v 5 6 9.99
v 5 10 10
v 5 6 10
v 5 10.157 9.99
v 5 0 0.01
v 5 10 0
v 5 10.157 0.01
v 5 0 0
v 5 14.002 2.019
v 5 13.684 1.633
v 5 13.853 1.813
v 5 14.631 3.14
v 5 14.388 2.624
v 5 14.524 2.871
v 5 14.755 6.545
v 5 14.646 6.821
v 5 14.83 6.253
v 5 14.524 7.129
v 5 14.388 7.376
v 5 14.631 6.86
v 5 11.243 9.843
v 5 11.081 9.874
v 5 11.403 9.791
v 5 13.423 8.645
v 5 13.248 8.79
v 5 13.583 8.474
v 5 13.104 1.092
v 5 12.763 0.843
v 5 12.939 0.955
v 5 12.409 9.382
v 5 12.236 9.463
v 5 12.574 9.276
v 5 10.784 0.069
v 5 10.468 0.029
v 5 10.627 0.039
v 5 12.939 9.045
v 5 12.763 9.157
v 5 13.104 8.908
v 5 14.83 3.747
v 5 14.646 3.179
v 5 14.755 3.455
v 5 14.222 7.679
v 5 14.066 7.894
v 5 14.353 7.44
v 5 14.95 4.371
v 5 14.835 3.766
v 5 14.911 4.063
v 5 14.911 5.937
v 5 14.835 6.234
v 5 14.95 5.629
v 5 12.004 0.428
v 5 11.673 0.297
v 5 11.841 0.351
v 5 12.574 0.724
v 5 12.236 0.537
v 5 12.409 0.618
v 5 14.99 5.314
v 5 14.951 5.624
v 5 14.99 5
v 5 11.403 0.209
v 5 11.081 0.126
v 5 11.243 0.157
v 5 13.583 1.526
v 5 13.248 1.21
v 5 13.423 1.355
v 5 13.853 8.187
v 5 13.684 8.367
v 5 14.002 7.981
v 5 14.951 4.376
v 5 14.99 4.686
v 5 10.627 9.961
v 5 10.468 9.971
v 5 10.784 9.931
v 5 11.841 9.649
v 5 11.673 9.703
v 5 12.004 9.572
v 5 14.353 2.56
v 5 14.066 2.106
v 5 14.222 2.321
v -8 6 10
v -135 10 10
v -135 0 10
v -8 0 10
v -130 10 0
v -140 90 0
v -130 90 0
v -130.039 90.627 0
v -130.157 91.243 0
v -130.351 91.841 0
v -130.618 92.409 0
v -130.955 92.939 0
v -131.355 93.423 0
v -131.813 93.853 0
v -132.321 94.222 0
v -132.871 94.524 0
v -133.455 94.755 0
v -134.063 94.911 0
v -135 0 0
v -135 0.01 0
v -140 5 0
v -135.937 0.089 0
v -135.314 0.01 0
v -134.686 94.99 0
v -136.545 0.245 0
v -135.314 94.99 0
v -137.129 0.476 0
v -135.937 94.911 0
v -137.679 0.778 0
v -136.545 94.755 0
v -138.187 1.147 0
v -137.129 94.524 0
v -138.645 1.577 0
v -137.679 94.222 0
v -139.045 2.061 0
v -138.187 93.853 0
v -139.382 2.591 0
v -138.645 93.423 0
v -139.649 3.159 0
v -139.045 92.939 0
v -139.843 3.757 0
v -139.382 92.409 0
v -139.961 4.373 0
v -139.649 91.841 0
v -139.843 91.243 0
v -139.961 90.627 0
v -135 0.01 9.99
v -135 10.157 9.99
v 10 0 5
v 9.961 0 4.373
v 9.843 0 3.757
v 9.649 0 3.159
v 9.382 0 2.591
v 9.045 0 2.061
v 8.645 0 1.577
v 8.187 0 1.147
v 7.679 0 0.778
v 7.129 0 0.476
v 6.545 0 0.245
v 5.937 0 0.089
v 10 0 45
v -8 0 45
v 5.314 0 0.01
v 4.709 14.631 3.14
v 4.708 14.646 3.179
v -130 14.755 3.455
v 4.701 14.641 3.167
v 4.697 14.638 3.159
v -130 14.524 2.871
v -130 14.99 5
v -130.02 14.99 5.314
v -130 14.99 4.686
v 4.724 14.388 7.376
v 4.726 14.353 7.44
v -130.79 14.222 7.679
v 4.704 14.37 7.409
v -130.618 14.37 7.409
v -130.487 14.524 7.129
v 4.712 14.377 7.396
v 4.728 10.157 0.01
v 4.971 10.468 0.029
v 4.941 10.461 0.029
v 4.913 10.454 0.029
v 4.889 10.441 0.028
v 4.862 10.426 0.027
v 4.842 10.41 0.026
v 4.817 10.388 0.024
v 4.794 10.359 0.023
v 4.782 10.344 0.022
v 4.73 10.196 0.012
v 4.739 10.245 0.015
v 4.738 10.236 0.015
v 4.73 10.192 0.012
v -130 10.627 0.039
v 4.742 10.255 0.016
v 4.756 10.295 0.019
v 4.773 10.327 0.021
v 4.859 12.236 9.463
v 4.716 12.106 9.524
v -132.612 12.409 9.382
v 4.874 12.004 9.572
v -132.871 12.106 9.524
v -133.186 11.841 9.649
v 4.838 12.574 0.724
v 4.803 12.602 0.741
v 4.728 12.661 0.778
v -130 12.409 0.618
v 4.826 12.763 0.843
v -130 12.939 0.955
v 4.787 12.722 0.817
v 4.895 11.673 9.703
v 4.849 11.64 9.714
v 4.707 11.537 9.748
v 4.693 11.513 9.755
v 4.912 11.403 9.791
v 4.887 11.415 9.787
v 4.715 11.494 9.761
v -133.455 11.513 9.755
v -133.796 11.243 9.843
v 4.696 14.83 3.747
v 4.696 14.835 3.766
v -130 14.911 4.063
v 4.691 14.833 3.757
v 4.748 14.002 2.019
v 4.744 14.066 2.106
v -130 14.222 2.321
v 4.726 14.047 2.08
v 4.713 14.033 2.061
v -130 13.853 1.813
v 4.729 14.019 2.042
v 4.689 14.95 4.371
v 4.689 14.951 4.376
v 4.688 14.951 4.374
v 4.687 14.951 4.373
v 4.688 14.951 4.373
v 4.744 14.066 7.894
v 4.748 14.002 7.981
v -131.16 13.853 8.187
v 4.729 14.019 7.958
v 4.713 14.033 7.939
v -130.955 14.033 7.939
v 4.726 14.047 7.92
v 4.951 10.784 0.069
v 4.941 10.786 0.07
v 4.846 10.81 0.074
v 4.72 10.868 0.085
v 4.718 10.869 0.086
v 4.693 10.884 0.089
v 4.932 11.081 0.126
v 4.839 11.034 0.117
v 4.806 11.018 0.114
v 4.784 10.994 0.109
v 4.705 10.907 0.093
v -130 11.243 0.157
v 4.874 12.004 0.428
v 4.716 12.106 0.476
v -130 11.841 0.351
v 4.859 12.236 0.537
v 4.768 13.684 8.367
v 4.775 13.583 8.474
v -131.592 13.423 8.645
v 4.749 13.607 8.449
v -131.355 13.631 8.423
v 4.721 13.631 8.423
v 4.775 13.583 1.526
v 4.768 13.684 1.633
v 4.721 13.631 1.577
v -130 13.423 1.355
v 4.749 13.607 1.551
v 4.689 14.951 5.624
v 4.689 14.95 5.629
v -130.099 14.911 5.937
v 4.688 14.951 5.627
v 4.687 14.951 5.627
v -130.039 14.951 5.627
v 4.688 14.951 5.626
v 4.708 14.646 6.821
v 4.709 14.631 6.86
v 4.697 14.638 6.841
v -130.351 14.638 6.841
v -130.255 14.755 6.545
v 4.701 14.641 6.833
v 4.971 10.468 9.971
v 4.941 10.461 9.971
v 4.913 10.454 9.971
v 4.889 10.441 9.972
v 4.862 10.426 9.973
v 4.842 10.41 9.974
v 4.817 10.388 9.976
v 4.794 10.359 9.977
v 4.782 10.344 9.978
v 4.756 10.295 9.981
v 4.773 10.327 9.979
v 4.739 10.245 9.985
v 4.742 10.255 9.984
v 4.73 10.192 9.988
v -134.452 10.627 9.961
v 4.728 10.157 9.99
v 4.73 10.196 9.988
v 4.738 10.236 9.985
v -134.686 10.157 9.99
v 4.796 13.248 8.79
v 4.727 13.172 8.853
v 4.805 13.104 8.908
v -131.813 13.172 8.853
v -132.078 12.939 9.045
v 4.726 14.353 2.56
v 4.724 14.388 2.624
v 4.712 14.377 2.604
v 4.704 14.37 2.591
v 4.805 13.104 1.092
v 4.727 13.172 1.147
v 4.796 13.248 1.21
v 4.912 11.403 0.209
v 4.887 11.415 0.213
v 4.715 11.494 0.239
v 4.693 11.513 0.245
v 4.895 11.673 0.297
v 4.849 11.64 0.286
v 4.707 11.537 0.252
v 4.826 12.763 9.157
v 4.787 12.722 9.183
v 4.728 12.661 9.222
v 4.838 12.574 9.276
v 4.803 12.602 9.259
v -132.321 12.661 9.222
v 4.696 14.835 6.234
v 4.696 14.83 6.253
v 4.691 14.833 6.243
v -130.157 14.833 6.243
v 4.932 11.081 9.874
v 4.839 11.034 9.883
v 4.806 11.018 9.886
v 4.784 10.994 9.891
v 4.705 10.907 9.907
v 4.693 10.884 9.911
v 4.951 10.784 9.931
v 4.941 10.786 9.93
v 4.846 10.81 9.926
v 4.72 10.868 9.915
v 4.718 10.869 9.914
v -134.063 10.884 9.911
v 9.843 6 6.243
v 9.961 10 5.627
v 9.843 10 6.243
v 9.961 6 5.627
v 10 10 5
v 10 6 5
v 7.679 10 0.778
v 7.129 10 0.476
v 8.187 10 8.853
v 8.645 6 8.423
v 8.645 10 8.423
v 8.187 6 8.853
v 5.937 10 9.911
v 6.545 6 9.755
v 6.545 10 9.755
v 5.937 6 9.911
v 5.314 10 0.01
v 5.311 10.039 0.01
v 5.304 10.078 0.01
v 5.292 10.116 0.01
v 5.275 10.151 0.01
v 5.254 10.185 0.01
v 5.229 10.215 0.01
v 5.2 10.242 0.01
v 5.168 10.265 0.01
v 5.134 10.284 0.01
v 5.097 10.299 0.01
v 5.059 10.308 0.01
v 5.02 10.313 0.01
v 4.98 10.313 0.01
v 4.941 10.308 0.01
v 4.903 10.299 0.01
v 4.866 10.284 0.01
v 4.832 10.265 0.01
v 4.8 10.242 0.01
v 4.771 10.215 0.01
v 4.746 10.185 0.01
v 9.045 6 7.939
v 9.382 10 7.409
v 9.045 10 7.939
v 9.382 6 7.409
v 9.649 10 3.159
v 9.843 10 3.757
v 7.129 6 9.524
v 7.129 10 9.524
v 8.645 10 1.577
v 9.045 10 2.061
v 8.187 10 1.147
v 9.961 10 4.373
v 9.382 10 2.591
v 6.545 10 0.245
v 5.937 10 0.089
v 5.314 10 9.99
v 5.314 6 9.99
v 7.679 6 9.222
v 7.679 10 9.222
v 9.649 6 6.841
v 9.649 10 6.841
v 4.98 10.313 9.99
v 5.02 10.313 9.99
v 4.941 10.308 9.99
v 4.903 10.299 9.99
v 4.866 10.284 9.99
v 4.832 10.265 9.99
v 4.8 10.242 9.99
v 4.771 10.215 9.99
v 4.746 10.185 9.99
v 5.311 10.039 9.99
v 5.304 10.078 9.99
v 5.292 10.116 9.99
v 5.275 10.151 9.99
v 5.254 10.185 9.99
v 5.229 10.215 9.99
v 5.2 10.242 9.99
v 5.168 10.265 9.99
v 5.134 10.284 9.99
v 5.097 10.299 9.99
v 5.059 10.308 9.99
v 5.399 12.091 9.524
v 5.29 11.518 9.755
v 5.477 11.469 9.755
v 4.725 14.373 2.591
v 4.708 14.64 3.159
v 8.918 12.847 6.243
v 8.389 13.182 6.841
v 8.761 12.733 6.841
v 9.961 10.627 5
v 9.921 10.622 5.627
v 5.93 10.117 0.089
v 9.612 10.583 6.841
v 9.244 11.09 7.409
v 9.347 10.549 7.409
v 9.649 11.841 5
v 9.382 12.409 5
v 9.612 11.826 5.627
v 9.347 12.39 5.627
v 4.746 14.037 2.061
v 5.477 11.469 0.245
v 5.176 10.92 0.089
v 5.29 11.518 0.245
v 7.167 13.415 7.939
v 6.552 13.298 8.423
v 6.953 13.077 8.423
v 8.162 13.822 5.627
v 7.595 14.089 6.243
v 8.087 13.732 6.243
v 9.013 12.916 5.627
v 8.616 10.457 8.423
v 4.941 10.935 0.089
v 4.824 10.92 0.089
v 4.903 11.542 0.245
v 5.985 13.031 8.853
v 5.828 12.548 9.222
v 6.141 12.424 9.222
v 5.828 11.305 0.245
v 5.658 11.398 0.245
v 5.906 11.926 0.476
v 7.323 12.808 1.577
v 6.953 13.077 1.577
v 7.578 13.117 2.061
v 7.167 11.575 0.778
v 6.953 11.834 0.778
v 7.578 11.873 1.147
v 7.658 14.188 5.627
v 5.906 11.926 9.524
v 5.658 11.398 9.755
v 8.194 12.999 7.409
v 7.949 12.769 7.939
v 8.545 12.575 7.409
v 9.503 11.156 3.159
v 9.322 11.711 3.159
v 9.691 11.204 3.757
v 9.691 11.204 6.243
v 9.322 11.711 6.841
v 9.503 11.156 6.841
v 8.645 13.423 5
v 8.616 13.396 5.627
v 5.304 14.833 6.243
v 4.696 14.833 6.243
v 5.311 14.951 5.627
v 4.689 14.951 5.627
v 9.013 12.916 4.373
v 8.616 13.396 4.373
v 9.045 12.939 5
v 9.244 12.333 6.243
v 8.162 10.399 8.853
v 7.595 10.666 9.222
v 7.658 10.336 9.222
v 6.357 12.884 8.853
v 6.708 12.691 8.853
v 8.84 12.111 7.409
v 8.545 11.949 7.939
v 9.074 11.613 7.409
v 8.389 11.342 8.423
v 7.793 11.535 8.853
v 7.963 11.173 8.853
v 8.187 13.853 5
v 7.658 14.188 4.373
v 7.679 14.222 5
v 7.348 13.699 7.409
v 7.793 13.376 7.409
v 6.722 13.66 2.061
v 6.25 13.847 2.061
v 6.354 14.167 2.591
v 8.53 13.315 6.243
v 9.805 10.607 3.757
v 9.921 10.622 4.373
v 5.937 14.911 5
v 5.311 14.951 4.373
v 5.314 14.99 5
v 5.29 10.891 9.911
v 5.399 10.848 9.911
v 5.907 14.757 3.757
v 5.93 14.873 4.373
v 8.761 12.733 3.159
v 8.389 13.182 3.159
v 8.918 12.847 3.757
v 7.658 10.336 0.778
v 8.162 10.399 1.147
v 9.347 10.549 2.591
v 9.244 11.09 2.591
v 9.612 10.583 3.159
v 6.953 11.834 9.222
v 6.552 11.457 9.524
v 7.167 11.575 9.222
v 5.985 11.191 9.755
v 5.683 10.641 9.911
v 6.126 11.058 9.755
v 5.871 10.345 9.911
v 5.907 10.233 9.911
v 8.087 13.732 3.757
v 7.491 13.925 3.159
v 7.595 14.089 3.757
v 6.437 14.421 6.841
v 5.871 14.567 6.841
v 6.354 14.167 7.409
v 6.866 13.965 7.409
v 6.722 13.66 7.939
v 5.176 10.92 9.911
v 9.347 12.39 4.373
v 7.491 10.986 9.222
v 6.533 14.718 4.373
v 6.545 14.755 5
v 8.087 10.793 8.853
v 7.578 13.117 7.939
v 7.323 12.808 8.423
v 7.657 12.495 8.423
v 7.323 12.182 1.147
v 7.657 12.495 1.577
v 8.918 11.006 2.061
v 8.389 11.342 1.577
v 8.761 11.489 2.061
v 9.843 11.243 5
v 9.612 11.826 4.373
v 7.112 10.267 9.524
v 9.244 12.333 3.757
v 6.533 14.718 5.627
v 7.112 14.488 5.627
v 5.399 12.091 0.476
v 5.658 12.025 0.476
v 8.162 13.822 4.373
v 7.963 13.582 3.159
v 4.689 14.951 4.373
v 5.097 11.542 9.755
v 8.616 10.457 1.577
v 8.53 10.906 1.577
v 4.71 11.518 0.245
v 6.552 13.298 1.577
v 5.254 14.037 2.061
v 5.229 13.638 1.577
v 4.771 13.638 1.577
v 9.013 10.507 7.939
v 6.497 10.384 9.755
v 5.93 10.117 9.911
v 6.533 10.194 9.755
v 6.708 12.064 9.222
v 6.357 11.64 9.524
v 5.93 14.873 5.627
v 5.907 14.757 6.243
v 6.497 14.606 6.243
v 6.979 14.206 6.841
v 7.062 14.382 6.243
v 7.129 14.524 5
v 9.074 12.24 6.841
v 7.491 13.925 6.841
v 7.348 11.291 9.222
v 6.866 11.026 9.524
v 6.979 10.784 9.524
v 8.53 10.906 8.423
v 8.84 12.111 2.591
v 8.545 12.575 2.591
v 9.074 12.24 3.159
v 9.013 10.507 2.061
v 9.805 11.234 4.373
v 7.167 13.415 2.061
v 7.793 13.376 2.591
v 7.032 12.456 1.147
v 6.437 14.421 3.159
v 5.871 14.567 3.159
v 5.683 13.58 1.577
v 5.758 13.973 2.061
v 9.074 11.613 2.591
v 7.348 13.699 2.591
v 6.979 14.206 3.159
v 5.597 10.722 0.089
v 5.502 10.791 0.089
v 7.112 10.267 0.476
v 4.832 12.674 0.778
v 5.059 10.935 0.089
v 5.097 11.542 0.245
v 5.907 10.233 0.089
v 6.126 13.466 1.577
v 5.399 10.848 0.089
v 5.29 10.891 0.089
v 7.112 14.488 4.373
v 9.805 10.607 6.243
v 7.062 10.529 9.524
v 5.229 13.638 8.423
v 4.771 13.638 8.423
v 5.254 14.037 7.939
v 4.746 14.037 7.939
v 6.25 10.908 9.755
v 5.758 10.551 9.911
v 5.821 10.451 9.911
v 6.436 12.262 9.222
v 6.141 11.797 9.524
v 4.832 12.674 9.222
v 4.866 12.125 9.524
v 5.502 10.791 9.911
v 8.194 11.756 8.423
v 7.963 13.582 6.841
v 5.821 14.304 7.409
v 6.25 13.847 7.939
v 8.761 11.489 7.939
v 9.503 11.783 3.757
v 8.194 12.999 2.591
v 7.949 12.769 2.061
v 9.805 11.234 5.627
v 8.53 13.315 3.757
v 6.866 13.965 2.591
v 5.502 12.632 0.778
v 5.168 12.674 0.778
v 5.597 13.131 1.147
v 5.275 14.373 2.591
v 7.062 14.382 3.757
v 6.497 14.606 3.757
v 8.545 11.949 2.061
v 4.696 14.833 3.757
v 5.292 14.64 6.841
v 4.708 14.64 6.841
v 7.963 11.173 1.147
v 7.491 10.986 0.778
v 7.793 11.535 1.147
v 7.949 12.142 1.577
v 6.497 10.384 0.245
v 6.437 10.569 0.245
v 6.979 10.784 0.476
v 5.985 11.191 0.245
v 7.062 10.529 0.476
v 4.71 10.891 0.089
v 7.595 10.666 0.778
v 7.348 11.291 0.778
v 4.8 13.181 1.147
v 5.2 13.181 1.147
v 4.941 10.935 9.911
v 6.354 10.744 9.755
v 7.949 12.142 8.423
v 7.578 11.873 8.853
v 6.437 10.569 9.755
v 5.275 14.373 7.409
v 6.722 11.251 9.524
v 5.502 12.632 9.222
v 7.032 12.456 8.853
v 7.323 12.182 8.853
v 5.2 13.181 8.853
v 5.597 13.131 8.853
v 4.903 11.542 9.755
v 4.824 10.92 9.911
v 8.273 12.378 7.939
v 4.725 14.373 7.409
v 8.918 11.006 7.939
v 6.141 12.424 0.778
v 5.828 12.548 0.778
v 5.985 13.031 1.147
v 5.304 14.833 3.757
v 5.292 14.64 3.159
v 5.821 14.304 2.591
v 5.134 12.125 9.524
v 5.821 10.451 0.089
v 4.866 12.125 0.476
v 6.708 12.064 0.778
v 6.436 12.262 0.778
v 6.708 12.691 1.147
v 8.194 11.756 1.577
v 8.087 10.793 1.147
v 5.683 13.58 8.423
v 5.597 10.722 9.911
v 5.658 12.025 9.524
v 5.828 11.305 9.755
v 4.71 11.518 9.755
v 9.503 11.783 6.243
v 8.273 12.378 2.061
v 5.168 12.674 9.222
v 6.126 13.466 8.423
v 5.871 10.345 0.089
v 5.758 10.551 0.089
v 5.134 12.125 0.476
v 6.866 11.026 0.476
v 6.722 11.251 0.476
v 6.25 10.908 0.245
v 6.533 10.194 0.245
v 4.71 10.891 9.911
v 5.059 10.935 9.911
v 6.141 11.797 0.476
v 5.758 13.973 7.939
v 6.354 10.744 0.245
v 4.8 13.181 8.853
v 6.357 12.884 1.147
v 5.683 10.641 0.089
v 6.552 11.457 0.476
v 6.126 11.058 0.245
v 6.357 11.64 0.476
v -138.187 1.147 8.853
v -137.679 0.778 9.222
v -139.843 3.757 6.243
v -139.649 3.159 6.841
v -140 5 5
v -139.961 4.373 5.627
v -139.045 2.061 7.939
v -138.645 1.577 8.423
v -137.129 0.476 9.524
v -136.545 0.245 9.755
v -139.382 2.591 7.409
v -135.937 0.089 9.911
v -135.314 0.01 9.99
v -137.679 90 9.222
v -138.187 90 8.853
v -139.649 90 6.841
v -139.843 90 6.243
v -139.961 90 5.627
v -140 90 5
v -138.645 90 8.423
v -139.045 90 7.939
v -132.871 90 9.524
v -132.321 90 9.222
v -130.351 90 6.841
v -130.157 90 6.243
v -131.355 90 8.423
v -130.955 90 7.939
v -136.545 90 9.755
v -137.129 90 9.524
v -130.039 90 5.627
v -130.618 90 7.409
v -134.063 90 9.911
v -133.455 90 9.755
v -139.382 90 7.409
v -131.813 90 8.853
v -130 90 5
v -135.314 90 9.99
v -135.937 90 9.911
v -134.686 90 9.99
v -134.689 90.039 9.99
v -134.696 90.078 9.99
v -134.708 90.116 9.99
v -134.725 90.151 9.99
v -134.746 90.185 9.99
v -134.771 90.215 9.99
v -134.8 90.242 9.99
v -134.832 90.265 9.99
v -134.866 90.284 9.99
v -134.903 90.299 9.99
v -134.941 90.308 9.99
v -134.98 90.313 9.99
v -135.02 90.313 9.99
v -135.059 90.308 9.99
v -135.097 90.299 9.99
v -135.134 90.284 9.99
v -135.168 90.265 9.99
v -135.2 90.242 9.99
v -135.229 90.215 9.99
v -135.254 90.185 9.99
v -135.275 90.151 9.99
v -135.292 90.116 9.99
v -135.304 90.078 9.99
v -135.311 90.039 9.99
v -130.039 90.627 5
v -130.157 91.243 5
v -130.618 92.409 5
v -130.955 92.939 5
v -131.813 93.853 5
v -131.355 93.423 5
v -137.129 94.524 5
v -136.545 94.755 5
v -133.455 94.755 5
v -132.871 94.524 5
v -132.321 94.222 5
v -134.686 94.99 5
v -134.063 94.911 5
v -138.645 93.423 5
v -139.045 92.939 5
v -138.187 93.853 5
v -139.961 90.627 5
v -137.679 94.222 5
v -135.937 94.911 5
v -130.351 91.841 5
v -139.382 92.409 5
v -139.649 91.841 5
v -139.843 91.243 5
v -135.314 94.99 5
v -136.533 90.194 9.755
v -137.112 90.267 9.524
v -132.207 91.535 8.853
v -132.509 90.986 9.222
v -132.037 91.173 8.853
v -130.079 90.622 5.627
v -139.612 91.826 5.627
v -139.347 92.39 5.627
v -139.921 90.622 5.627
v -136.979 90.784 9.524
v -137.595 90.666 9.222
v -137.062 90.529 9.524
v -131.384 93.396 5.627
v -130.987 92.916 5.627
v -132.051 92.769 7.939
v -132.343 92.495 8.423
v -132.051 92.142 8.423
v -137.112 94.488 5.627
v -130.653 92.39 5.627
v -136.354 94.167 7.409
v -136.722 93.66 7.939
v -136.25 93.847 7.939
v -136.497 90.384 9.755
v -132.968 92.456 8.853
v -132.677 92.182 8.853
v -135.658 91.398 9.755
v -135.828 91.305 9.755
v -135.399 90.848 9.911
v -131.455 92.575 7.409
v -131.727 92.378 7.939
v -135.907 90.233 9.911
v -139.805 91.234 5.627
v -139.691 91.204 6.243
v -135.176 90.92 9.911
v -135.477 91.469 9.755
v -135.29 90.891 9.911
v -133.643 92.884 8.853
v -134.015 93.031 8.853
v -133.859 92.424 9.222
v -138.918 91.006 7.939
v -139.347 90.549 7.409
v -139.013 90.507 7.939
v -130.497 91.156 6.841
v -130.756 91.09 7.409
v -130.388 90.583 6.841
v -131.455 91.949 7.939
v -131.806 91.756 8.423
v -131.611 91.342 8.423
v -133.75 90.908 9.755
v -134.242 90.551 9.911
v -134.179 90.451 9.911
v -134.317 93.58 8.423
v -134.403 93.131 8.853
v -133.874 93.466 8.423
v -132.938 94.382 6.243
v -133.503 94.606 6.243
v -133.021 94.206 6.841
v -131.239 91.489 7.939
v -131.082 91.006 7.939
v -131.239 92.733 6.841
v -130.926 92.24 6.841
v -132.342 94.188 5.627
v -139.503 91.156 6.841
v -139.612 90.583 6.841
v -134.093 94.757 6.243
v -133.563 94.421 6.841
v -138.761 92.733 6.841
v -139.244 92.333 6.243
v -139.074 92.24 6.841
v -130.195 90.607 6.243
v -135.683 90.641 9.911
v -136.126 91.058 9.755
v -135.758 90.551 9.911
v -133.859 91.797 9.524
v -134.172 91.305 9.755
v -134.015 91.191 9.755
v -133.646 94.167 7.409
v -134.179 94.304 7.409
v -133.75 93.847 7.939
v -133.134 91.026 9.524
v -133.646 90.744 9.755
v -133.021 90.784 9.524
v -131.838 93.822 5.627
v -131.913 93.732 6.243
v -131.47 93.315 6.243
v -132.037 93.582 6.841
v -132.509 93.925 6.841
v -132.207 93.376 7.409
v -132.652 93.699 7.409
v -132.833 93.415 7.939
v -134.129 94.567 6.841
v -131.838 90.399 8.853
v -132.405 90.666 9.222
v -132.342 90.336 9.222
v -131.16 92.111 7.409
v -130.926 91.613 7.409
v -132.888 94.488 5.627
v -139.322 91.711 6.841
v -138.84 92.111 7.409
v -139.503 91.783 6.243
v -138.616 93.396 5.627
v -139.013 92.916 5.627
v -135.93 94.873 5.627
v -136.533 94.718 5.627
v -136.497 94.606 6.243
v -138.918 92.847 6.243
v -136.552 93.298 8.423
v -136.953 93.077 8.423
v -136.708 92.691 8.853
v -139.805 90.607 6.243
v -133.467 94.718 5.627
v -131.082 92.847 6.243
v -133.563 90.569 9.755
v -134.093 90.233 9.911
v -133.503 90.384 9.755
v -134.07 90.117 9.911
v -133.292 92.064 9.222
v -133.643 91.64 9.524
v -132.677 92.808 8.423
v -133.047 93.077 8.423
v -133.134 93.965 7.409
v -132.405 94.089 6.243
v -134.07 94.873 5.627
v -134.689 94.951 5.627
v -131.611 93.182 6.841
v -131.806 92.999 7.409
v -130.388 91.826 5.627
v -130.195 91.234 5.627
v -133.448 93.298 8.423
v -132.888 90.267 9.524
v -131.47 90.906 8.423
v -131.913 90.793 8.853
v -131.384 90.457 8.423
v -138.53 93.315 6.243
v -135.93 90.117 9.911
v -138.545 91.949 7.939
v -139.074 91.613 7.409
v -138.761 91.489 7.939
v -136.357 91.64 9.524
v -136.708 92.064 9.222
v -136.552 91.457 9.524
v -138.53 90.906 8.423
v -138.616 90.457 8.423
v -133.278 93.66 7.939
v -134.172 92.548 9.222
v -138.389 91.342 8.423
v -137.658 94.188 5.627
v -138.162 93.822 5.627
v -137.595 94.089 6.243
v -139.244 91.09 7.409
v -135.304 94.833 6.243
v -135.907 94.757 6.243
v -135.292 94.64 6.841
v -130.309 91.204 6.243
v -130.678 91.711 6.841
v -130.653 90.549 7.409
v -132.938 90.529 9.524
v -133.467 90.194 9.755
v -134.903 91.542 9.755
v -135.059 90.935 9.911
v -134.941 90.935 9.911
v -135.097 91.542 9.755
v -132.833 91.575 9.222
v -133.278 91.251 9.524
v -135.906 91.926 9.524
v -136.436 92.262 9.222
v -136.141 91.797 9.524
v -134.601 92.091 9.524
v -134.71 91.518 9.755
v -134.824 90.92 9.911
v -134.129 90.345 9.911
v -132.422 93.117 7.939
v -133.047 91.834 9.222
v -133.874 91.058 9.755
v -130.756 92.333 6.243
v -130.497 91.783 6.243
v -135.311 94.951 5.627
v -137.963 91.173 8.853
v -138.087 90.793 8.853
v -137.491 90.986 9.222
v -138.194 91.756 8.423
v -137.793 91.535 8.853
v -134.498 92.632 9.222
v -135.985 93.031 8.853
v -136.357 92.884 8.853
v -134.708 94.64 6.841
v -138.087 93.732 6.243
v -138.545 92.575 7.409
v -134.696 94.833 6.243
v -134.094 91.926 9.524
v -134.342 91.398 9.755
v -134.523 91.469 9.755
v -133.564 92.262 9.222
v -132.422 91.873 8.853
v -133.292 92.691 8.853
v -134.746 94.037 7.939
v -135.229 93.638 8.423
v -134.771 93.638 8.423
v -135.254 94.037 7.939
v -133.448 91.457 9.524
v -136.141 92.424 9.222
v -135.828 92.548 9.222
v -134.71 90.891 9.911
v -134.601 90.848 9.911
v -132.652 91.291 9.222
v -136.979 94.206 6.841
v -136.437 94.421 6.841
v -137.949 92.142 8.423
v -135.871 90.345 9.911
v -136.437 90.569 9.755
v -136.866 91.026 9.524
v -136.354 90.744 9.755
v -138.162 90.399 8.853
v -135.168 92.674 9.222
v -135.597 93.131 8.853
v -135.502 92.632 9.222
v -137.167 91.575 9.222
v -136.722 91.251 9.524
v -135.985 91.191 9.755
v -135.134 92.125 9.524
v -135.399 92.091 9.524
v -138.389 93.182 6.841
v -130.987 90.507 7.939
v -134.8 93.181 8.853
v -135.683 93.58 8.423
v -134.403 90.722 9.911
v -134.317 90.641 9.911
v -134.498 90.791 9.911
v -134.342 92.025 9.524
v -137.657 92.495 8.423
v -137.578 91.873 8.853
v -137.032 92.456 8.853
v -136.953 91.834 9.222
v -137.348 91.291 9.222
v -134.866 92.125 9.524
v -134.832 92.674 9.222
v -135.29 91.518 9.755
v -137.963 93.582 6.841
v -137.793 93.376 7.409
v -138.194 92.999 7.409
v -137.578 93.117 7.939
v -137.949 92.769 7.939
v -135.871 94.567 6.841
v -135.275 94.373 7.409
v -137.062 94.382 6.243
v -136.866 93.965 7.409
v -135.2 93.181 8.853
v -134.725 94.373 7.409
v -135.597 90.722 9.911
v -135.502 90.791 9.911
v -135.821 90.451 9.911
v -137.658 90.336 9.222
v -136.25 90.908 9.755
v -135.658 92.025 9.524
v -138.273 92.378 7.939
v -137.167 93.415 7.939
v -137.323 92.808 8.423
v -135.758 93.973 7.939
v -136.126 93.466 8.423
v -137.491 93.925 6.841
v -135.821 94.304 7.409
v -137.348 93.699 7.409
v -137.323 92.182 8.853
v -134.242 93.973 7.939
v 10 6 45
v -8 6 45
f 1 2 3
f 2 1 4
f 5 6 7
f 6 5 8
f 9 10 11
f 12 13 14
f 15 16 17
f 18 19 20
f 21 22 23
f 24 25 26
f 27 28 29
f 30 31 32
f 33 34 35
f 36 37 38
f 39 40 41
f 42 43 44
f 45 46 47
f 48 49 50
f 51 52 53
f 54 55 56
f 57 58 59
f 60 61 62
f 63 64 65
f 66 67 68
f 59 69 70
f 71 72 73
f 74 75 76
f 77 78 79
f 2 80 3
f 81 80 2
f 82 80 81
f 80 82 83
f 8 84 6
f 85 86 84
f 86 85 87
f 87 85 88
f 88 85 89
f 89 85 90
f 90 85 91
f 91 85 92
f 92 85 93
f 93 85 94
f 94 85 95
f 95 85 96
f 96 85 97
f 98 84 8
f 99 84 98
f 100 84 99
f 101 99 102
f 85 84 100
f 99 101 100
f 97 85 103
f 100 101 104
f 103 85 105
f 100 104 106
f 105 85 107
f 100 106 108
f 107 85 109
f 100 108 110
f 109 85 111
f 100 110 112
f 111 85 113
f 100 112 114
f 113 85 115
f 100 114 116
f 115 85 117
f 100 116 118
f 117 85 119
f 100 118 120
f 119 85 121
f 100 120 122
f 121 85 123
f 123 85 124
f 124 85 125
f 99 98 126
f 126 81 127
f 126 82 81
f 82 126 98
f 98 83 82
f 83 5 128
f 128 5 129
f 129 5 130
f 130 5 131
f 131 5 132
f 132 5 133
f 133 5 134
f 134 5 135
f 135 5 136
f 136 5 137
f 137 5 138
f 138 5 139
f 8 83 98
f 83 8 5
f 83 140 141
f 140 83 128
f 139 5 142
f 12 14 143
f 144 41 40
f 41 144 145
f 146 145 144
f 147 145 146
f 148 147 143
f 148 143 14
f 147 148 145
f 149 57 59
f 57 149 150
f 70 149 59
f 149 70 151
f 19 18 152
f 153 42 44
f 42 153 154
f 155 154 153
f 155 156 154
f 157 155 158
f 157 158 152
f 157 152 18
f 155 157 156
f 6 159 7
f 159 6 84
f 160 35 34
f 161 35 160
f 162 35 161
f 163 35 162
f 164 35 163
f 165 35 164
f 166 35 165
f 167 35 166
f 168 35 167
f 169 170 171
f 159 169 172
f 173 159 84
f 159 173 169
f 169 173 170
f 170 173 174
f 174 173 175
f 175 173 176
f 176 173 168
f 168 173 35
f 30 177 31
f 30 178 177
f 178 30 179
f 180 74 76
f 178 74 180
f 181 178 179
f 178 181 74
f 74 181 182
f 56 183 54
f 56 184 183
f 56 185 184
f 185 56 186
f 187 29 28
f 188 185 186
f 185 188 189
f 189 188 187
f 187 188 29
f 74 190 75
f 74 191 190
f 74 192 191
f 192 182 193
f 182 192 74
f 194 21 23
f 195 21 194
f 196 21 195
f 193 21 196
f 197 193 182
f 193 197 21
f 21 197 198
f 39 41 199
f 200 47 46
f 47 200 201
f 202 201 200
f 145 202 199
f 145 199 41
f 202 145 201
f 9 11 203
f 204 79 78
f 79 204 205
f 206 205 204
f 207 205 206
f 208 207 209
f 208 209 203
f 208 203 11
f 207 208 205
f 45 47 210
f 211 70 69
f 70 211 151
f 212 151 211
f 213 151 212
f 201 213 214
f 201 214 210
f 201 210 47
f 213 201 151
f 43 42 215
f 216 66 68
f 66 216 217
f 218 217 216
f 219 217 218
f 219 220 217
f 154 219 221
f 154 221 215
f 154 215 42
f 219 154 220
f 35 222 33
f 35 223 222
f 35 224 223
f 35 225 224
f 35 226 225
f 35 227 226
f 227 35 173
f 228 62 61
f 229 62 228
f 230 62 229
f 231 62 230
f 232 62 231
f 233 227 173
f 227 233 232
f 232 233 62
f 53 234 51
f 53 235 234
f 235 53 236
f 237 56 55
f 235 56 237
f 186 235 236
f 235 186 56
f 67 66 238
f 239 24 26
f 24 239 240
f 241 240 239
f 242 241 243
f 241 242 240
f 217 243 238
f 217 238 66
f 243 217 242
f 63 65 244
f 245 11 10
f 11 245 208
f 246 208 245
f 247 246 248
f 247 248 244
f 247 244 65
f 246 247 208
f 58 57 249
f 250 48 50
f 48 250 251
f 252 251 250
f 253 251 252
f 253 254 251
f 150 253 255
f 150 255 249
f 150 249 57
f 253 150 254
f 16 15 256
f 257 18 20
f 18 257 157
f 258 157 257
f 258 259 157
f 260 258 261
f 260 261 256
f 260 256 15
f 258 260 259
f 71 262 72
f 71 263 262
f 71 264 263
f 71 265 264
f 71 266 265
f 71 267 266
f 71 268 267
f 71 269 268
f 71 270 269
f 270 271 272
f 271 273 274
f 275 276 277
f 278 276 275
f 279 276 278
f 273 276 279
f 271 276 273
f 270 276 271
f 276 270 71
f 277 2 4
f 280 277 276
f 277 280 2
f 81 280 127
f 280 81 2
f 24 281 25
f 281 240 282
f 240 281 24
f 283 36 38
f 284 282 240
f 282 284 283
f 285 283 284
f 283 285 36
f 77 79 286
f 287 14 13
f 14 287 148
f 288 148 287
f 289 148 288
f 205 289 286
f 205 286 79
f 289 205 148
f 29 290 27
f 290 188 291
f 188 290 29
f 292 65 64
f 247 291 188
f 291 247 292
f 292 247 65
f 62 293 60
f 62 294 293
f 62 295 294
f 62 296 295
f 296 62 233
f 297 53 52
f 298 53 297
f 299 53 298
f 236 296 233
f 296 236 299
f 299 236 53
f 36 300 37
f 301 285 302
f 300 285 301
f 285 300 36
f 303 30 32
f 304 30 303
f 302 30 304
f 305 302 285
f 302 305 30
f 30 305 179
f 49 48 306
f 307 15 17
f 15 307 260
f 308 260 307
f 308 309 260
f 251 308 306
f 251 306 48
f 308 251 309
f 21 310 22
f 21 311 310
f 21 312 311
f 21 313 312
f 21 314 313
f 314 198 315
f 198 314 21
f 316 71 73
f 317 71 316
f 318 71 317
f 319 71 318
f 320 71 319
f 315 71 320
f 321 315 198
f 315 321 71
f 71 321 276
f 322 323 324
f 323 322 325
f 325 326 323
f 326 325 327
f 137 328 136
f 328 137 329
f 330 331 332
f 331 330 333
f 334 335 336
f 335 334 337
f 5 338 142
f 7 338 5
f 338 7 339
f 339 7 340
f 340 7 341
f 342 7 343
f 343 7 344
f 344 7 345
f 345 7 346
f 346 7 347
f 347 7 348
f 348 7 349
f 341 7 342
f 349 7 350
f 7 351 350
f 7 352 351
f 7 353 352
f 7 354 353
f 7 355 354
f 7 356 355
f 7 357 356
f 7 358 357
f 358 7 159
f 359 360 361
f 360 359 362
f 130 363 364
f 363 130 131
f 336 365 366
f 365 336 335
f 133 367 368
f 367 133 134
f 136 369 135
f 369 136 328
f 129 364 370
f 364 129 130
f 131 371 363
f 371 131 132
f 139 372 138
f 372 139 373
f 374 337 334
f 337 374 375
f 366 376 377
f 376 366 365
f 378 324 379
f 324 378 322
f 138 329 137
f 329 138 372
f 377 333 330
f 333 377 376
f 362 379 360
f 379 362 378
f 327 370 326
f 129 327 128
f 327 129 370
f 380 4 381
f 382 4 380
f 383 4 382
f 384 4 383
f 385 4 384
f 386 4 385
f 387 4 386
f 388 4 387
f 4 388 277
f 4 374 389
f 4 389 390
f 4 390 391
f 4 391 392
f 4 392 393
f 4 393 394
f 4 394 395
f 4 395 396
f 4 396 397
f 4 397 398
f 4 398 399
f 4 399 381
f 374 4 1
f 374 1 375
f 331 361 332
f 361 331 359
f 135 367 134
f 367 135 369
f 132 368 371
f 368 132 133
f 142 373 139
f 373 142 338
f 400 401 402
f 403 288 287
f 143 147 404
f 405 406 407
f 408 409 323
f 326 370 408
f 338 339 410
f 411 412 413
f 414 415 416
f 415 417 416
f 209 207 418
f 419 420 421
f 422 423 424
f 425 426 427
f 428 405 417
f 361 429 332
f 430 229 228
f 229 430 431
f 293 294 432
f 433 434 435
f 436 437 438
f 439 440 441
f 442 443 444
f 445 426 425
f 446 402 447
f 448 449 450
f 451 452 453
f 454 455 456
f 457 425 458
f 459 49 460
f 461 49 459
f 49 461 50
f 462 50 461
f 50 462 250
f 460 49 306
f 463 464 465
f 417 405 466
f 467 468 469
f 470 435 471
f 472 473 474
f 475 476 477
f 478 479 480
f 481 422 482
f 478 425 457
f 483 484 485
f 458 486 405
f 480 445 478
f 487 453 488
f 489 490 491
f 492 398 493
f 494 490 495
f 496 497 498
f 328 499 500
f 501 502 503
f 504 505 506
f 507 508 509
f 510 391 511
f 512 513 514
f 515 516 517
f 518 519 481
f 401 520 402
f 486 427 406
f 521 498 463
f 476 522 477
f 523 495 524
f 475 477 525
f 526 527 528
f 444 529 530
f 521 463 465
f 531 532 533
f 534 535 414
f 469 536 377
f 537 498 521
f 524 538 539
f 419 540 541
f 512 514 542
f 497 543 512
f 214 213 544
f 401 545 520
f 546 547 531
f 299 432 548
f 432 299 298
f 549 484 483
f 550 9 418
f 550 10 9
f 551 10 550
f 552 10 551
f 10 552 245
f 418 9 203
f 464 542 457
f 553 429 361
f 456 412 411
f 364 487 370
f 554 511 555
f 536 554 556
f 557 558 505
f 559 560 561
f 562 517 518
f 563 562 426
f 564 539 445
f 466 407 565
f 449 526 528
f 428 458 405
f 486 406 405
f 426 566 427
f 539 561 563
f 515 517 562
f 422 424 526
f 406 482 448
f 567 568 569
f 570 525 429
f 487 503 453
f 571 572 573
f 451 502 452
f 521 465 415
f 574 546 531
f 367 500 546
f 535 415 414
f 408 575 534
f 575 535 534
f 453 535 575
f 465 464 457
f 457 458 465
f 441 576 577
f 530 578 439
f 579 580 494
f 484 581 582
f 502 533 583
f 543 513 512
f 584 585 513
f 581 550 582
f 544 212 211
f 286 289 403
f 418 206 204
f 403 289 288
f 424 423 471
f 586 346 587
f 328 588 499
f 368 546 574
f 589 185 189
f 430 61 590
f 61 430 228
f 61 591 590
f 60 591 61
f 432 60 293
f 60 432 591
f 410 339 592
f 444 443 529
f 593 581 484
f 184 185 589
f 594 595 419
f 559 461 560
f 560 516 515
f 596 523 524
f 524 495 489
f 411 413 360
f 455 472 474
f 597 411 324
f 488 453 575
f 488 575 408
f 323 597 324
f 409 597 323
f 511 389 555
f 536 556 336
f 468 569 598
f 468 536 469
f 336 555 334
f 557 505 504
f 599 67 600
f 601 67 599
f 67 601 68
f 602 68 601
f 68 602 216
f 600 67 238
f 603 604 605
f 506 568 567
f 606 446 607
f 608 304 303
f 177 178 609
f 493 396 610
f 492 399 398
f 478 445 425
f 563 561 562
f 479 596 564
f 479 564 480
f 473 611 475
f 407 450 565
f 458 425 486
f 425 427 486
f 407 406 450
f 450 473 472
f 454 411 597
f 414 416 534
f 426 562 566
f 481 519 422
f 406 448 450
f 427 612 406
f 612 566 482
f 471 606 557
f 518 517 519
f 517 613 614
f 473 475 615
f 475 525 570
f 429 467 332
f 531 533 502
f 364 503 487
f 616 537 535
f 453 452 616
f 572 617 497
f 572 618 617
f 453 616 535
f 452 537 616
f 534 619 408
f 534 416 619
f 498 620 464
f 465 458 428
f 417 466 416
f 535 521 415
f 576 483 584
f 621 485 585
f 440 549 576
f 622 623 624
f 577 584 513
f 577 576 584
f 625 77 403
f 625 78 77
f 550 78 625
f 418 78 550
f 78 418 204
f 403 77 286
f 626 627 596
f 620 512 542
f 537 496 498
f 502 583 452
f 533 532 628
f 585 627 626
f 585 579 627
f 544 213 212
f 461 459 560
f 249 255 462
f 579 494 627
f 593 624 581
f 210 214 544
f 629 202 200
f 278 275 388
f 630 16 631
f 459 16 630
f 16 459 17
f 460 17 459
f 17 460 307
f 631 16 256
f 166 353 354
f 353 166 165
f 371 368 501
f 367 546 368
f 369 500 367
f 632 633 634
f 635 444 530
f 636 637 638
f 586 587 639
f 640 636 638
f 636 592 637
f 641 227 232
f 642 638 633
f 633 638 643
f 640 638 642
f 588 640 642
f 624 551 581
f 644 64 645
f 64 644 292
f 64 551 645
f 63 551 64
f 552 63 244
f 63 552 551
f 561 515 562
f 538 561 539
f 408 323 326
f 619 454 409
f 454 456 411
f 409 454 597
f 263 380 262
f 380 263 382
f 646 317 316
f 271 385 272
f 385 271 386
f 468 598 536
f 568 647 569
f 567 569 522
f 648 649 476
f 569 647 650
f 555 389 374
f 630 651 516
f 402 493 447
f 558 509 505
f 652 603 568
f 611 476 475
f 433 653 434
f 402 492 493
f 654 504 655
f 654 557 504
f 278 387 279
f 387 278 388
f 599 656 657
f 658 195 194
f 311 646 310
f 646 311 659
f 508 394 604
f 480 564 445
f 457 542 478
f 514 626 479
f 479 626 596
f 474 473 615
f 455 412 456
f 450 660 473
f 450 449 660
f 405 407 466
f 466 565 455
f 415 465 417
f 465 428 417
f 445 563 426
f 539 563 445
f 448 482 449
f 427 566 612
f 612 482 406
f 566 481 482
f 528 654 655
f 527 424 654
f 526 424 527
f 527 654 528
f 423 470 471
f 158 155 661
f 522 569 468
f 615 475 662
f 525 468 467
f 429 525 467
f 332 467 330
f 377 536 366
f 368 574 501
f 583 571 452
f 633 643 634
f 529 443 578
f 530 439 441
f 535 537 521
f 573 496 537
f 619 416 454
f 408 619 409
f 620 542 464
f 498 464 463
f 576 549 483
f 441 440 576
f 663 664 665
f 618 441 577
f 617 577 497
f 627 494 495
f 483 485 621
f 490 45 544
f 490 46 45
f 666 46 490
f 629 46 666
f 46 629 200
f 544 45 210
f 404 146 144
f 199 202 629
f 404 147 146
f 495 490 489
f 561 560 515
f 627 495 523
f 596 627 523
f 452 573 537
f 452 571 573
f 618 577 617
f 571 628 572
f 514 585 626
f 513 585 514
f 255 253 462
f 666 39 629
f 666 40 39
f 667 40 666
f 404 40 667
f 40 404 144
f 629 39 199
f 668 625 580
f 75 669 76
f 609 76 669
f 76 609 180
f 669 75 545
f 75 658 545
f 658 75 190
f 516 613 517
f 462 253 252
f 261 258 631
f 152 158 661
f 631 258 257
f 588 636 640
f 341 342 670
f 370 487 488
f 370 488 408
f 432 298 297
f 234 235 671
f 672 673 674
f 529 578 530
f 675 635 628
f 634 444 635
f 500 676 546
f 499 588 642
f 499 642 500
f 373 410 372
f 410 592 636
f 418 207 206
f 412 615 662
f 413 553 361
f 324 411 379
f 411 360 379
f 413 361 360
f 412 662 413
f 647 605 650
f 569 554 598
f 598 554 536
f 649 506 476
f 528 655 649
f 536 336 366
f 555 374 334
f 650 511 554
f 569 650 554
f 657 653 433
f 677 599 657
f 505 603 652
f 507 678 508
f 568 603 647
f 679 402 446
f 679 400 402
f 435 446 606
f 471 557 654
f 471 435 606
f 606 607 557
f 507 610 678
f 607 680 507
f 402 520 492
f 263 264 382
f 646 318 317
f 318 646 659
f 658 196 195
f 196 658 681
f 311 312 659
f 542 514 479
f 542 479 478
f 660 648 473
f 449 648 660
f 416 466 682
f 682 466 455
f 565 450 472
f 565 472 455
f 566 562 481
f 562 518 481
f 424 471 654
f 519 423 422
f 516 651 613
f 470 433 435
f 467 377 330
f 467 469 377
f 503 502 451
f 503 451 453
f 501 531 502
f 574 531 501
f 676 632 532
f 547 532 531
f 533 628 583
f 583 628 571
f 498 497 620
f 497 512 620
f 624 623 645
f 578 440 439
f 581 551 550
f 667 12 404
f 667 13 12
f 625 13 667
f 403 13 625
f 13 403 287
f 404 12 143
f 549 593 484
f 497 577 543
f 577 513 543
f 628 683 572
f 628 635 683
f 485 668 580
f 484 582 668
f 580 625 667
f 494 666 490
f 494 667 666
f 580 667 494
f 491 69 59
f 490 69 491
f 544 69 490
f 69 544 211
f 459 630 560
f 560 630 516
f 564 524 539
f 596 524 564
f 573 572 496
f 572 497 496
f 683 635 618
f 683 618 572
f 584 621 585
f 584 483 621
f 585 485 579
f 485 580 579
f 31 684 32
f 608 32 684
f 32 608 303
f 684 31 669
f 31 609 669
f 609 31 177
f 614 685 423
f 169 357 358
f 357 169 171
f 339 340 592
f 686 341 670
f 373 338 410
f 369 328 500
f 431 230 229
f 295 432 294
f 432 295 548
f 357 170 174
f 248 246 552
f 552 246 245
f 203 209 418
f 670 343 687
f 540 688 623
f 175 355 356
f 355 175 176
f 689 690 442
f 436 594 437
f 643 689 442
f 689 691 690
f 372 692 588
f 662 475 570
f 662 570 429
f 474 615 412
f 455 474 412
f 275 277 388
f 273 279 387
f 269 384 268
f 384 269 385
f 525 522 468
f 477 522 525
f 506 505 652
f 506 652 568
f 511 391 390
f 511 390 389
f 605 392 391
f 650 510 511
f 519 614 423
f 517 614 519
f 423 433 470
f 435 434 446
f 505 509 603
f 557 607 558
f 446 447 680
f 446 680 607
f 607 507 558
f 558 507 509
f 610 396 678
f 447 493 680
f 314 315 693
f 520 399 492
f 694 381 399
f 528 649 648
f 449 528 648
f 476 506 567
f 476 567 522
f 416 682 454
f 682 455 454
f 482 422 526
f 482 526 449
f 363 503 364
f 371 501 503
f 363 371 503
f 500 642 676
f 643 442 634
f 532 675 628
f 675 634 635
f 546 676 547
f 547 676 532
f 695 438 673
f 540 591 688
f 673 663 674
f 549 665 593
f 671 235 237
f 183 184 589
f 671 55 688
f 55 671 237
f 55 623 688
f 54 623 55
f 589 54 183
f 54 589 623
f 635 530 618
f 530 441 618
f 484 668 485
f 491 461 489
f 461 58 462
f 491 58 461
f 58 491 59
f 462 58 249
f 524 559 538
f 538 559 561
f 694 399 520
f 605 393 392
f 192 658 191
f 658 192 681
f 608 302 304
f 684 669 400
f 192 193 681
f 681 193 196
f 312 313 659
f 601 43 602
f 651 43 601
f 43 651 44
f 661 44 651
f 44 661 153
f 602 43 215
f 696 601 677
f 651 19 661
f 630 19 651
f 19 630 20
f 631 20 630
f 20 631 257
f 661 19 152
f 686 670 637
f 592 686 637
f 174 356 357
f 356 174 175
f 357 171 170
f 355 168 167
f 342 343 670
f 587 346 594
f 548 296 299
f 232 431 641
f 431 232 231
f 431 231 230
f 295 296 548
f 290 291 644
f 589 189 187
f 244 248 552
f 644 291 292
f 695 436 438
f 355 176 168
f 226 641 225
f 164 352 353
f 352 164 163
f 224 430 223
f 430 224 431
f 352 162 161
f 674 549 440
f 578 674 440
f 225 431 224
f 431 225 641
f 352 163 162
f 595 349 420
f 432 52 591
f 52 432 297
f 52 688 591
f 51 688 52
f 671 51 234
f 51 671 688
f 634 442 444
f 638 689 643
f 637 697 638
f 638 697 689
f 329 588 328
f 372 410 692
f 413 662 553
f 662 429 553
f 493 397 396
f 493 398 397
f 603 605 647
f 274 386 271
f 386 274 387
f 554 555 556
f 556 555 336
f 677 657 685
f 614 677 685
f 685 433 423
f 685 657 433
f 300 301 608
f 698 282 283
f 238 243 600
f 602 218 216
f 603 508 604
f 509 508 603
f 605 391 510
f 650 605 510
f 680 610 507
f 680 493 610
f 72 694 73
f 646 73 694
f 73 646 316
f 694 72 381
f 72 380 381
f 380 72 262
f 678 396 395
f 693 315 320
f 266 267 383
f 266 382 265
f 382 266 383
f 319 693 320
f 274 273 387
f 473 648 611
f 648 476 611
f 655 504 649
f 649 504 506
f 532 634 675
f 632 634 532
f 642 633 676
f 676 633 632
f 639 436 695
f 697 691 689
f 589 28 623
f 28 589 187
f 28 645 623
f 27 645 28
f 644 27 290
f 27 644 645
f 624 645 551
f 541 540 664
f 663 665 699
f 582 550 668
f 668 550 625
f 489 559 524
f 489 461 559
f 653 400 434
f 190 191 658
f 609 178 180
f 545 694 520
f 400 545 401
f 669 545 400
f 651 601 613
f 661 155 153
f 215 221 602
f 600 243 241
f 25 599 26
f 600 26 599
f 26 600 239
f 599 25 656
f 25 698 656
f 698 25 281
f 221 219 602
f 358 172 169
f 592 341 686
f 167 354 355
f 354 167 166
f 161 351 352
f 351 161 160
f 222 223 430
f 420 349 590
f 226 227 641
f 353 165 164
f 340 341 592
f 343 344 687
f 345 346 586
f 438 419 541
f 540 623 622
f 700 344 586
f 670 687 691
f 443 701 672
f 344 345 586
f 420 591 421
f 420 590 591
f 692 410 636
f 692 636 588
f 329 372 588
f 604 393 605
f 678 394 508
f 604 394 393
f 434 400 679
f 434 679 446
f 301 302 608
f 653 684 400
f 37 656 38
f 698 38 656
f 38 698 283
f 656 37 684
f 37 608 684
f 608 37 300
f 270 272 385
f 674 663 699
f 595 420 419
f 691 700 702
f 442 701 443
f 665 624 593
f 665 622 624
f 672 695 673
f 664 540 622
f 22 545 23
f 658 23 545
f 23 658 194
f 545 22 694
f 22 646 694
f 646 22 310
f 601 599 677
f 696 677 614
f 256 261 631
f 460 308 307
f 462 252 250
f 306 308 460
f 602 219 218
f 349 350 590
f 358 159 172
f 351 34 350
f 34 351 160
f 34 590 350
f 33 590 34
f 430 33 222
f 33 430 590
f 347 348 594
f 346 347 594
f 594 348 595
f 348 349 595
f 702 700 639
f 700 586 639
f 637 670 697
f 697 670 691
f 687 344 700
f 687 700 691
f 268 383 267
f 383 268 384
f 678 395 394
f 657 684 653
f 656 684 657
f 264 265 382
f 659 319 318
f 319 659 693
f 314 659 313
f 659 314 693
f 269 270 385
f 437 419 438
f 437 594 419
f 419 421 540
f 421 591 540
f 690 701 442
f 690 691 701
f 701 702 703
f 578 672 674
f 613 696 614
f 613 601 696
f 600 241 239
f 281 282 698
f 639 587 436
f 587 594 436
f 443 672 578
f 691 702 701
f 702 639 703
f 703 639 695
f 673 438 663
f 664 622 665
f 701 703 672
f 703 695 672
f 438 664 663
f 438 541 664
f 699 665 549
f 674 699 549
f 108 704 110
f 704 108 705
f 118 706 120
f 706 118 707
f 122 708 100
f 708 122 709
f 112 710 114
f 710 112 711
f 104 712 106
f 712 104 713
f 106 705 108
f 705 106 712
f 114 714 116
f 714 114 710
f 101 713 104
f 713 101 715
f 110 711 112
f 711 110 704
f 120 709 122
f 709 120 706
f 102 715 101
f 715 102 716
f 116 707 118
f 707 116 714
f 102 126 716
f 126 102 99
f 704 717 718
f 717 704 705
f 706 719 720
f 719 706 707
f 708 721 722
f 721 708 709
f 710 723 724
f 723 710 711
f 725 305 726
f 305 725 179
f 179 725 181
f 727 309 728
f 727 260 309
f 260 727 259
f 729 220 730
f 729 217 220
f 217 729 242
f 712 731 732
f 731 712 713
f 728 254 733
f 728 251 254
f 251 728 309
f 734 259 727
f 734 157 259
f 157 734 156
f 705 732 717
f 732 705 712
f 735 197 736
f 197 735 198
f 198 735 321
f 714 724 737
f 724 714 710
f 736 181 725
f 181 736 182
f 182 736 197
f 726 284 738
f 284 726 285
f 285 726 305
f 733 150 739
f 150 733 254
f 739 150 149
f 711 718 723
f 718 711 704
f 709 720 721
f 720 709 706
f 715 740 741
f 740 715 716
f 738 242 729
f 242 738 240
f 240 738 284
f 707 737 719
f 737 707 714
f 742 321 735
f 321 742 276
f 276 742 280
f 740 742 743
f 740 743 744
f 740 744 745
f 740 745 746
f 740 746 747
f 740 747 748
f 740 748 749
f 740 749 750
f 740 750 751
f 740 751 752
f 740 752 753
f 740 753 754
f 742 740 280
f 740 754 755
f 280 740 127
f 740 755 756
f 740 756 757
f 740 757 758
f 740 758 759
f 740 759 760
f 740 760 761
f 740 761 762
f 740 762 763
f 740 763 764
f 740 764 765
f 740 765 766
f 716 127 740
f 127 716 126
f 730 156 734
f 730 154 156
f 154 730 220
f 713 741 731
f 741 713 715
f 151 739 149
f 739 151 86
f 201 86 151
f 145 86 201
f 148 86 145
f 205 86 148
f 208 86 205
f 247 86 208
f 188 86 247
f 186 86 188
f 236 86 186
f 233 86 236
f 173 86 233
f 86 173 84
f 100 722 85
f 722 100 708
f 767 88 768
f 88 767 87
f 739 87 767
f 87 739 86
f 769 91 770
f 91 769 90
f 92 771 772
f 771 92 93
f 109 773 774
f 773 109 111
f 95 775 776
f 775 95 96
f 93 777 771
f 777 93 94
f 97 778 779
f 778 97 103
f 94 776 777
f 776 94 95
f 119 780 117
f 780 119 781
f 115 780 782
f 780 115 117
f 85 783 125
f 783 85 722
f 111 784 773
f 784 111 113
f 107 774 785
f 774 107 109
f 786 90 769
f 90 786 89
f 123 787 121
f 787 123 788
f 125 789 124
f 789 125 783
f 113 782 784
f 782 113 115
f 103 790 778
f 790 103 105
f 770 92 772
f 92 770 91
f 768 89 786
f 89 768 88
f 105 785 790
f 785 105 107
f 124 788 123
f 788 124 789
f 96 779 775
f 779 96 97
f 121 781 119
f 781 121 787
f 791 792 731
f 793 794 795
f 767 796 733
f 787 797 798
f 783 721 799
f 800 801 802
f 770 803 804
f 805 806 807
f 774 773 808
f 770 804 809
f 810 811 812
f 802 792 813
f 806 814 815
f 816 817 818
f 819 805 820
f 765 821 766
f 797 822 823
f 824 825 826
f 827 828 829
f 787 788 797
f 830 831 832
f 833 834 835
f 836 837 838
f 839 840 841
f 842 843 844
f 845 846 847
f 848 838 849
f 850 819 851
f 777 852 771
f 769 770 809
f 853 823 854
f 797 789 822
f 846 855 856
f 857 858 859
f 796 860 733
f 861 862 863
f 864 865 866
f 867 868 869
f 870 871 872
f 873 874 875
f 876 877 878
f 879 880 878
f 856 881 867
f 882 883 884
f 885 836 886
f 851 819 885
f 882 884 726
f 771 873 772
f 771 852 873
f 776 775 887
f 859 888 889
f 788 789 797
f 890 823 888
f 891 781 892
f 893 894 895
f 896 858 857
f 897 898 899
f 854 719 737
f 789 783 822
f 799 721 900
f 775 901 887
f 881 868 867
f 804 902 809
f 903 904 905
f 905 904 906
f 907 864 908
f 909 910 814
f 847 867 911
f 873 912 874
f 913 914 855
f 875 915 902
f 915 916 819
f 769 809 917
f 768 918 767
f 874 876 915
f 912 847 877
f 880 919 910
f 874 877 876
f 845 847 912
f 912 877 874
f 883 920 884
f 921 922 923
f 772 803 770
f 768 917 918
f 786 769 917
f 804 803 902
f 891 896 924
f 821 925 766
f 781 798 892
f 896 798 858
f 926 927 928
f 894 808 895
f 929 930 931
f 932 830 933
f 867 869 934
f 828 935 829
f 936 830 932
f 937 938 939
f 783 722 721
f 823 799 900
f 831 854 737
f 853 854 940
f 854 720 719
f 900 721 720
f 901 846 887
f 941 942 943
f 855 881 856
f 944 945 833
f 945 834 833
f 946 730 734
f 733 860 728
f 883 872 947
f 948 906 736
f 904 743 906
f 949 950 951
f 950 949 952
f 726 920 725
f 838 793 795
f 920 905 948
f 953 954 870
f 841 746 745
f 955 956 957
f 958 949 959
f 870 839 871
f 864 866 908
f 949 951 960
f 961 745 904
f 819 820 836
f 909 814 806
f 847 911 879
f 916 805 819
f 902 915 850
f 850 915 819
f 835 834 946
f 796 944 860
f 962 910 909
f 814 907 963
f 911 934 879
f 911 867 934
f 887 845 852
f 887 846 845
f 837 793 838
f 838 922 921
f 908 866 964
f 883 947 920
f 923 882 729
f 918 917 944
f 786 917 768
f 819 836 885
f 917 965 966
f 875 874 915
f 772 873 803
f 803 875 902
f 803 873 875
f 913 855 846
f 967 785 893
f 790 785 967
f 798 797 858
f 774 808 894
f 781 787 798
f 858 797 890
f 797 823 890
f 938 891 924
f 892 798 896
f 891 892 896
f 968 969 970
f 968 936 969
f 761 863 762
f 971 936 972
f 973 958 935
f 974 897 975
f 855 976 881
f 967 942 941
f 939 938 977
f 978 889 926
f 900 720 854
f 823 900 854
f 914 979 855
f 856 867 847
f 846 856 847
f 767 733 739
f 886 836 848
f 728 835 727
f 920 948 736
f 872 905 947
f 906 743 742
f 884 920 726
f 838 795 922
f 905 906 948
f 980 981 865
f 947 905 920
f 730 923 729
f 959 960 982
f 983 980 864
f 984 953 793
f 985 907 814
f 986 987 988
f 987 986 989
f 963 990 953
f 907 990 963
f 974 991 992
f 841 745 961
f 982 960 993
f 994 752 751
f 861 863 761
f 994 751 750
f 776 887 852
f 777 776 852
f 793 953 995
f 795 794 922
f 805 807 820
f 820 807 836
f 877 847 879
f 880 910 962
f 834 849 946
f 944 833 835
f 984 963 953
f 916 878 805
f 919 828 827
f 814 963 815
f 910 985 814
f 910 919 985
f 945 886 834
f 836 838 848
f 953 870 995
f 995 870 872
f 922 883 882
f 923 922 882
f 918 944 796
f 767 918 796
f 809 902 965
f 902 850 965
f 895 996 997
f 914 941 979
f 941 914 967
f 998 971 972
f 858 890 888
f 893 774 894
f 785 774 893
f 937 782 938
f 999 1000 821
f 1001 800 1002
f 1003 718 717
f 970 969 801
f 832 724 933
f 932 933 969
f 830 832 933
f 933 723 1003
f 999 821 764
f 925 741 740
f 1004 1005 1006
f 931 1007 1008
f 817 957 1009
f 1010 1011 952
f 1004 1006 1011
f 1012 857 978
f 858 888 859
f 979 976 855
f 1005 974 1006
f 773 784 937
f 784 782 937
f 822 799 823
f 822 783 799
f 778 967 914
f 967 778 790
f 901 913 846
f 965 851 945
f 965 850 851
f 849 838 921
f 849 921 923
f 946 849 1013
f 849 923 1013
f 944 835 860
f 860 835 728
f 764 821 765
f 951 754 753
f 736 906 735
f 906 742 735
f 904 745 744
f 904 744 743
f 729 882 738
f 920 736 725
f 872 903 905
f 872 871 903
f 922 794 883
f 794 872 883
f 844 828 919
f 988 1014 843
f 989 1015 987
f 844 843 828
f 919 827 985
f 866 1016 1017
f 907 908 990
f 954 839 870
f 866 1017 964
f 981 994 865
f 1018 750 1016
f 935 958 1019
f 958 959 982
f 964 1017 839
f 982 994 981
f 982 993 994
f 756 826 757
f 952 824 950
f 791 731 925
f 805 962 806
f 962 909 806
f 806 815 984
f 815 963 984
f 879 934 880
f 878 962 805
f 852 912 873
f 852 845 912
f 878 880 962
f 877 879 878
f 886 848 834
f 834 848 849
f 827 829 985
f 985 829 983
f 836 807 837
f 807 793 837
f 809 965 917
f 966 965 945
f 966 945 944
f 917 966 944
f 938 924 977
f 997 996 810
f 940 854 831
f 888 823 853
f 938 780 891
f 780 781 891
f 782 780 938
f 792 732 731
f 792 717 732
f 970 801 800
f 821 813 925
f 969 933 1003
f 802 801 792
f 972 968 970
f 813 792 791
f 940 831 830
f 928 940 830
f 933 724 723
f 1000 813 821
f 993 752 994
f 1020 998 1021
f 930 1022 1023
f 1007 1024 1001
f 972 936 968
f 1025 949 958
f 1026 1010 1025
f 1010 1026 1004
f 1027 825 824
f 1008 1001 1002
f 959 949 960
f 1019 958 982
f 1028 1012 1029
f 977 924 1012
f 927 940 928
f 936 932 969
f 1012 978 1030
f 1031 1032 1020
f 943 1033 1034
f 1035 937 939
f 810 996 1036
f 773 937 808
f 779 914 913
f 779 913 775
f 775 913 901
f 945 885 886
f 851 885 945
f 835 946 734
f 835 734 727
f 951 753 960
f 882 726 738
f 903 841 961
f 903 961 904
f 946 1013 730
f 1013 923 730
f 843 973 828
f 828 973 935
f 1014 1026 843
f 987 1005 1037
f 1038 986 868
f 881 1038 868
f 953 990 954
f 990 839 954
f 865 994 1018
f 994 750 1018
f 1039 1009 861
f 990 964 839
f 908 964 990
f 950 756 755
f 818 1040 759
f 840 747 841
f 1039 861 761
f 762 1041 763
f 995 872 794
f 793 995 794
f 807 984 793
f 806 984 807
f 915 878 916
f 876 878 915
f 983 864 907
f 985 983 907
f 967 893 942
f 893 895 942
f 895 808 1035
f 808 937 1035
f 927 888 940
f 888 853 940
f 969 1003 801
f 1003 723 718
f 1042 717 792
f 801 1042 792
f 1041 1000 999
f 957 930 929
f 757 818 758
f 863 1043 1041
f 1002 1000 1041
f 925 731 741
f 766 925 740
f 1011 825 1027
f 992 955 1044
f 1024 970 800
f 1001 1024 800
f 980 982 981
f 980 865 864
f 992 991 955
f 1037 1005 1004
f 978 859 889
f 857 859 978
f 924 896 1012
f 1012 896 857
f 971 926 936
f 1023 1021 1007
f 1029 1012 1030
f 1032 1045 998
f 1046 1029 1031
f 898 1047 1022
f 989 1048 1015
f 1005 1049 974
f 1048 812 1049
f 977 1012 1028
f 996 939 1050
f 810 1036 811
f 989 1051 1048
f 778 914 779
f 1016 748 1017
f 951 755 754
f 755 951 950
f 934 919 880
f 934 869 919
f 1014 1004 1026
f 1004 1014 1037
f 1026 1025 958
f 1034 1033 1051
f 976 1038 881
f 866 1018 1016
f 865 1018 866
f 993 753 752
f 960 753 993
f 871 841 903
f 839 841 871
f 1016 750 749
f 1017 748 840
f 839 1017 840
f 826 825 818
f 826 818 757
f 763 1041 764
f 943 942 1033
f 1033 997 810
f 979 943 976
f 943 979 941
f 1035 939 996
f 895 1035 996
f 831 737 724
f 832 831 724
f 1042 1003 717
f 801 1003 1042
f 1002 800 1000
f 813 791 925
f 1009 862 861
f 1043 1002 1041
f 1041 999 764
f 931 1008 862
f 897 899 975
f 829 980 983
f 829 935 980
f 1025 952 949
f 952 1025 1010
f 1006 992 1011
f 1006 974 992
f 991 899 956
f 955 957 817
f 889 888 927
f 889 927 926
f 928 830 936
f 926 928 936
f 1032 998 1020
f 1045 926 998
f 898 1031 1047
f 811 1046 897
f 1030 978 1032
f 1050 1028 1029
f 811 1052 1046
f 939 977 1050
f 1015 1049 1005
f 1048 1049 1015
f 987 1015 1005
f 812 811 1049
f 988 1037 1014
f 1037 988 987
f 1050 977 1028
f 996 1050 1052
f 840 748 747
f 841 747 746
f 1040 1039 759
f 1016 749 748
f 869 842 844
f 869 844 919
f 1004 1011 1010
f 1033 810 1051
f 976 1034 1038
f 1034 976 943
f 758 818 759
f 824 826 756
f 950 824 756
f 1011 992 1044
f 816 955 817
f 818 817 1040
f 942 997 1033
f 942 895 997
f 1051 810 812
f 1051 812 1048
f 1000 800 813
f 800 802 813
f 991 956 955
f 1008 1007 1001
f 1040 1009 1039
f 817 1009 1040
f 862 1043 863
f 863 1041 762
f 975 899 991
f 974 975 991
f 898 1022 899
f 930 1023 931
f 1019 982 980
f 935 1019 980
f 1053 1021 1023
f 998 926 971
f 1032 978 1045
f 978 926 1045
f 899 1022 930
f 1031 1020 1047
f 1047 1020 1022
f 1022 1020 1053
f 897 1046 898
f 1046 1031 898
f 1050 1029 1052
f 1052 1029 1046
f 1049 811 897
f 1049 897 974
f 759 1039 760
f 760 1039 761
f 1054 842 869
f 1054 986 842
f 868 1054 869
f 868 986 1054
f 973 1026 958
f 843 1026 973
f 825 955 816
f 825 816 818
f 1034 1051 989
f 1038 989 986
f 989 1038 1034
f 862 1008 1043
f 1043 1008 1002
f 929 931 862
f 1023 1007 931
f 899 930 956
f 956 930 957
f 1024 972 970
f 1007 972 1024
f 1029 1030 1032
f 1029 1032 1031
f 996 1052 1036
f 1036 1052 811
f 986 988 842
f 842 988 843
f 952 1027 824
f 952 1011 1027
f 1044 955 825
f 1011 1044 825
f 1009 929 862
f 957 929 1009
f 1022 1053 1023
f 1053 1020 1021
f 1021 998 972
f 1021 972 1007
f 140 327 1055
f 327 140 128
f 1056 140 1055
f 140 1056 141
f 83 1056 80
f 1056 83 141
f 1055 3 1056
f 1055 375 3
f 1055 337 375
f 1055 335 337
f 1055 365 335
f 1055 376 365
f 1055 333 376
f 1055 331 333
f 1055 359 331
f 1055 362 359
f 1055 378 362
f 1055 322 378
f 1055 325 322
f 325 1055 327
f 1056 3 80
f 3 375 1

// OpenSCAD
$fn=50;

translate([-8,0,5]) cube([18,6,40]);
translate([-135,0,0]) {
	cube([140,10,10]);
	translate([0,10,5]) rotate([0,90,0]) cylinder(140, d=10);

	translate([140,10,5]) rotate([90,0,0]) cylinder(10, d=10);	
	translate([140,10,5]) sphere(5);
}

translate([-140,0,0]) {
	translate([0,5,0]) cube([10, 85, 5]);
 	translate([5,5,5]) rotate([-90,0,0]) cylinder(85, d=10);

 	translate([5,90,0]) rotate([0,0,0]) cylinder(5, d=10);
	translate([5,90,5]) sphere(d=10);

 	translate([5,5,0]) rotate([0,0,0]) cylinder(5, d=10);
	intersection() {
 		translate([5,5,0]) rotate([0,0,0]) cylinder(10, d=10);
 		translate([5,0,5]) rotate([-90,0,0]) cylinder(10, d=10);
	}
}
